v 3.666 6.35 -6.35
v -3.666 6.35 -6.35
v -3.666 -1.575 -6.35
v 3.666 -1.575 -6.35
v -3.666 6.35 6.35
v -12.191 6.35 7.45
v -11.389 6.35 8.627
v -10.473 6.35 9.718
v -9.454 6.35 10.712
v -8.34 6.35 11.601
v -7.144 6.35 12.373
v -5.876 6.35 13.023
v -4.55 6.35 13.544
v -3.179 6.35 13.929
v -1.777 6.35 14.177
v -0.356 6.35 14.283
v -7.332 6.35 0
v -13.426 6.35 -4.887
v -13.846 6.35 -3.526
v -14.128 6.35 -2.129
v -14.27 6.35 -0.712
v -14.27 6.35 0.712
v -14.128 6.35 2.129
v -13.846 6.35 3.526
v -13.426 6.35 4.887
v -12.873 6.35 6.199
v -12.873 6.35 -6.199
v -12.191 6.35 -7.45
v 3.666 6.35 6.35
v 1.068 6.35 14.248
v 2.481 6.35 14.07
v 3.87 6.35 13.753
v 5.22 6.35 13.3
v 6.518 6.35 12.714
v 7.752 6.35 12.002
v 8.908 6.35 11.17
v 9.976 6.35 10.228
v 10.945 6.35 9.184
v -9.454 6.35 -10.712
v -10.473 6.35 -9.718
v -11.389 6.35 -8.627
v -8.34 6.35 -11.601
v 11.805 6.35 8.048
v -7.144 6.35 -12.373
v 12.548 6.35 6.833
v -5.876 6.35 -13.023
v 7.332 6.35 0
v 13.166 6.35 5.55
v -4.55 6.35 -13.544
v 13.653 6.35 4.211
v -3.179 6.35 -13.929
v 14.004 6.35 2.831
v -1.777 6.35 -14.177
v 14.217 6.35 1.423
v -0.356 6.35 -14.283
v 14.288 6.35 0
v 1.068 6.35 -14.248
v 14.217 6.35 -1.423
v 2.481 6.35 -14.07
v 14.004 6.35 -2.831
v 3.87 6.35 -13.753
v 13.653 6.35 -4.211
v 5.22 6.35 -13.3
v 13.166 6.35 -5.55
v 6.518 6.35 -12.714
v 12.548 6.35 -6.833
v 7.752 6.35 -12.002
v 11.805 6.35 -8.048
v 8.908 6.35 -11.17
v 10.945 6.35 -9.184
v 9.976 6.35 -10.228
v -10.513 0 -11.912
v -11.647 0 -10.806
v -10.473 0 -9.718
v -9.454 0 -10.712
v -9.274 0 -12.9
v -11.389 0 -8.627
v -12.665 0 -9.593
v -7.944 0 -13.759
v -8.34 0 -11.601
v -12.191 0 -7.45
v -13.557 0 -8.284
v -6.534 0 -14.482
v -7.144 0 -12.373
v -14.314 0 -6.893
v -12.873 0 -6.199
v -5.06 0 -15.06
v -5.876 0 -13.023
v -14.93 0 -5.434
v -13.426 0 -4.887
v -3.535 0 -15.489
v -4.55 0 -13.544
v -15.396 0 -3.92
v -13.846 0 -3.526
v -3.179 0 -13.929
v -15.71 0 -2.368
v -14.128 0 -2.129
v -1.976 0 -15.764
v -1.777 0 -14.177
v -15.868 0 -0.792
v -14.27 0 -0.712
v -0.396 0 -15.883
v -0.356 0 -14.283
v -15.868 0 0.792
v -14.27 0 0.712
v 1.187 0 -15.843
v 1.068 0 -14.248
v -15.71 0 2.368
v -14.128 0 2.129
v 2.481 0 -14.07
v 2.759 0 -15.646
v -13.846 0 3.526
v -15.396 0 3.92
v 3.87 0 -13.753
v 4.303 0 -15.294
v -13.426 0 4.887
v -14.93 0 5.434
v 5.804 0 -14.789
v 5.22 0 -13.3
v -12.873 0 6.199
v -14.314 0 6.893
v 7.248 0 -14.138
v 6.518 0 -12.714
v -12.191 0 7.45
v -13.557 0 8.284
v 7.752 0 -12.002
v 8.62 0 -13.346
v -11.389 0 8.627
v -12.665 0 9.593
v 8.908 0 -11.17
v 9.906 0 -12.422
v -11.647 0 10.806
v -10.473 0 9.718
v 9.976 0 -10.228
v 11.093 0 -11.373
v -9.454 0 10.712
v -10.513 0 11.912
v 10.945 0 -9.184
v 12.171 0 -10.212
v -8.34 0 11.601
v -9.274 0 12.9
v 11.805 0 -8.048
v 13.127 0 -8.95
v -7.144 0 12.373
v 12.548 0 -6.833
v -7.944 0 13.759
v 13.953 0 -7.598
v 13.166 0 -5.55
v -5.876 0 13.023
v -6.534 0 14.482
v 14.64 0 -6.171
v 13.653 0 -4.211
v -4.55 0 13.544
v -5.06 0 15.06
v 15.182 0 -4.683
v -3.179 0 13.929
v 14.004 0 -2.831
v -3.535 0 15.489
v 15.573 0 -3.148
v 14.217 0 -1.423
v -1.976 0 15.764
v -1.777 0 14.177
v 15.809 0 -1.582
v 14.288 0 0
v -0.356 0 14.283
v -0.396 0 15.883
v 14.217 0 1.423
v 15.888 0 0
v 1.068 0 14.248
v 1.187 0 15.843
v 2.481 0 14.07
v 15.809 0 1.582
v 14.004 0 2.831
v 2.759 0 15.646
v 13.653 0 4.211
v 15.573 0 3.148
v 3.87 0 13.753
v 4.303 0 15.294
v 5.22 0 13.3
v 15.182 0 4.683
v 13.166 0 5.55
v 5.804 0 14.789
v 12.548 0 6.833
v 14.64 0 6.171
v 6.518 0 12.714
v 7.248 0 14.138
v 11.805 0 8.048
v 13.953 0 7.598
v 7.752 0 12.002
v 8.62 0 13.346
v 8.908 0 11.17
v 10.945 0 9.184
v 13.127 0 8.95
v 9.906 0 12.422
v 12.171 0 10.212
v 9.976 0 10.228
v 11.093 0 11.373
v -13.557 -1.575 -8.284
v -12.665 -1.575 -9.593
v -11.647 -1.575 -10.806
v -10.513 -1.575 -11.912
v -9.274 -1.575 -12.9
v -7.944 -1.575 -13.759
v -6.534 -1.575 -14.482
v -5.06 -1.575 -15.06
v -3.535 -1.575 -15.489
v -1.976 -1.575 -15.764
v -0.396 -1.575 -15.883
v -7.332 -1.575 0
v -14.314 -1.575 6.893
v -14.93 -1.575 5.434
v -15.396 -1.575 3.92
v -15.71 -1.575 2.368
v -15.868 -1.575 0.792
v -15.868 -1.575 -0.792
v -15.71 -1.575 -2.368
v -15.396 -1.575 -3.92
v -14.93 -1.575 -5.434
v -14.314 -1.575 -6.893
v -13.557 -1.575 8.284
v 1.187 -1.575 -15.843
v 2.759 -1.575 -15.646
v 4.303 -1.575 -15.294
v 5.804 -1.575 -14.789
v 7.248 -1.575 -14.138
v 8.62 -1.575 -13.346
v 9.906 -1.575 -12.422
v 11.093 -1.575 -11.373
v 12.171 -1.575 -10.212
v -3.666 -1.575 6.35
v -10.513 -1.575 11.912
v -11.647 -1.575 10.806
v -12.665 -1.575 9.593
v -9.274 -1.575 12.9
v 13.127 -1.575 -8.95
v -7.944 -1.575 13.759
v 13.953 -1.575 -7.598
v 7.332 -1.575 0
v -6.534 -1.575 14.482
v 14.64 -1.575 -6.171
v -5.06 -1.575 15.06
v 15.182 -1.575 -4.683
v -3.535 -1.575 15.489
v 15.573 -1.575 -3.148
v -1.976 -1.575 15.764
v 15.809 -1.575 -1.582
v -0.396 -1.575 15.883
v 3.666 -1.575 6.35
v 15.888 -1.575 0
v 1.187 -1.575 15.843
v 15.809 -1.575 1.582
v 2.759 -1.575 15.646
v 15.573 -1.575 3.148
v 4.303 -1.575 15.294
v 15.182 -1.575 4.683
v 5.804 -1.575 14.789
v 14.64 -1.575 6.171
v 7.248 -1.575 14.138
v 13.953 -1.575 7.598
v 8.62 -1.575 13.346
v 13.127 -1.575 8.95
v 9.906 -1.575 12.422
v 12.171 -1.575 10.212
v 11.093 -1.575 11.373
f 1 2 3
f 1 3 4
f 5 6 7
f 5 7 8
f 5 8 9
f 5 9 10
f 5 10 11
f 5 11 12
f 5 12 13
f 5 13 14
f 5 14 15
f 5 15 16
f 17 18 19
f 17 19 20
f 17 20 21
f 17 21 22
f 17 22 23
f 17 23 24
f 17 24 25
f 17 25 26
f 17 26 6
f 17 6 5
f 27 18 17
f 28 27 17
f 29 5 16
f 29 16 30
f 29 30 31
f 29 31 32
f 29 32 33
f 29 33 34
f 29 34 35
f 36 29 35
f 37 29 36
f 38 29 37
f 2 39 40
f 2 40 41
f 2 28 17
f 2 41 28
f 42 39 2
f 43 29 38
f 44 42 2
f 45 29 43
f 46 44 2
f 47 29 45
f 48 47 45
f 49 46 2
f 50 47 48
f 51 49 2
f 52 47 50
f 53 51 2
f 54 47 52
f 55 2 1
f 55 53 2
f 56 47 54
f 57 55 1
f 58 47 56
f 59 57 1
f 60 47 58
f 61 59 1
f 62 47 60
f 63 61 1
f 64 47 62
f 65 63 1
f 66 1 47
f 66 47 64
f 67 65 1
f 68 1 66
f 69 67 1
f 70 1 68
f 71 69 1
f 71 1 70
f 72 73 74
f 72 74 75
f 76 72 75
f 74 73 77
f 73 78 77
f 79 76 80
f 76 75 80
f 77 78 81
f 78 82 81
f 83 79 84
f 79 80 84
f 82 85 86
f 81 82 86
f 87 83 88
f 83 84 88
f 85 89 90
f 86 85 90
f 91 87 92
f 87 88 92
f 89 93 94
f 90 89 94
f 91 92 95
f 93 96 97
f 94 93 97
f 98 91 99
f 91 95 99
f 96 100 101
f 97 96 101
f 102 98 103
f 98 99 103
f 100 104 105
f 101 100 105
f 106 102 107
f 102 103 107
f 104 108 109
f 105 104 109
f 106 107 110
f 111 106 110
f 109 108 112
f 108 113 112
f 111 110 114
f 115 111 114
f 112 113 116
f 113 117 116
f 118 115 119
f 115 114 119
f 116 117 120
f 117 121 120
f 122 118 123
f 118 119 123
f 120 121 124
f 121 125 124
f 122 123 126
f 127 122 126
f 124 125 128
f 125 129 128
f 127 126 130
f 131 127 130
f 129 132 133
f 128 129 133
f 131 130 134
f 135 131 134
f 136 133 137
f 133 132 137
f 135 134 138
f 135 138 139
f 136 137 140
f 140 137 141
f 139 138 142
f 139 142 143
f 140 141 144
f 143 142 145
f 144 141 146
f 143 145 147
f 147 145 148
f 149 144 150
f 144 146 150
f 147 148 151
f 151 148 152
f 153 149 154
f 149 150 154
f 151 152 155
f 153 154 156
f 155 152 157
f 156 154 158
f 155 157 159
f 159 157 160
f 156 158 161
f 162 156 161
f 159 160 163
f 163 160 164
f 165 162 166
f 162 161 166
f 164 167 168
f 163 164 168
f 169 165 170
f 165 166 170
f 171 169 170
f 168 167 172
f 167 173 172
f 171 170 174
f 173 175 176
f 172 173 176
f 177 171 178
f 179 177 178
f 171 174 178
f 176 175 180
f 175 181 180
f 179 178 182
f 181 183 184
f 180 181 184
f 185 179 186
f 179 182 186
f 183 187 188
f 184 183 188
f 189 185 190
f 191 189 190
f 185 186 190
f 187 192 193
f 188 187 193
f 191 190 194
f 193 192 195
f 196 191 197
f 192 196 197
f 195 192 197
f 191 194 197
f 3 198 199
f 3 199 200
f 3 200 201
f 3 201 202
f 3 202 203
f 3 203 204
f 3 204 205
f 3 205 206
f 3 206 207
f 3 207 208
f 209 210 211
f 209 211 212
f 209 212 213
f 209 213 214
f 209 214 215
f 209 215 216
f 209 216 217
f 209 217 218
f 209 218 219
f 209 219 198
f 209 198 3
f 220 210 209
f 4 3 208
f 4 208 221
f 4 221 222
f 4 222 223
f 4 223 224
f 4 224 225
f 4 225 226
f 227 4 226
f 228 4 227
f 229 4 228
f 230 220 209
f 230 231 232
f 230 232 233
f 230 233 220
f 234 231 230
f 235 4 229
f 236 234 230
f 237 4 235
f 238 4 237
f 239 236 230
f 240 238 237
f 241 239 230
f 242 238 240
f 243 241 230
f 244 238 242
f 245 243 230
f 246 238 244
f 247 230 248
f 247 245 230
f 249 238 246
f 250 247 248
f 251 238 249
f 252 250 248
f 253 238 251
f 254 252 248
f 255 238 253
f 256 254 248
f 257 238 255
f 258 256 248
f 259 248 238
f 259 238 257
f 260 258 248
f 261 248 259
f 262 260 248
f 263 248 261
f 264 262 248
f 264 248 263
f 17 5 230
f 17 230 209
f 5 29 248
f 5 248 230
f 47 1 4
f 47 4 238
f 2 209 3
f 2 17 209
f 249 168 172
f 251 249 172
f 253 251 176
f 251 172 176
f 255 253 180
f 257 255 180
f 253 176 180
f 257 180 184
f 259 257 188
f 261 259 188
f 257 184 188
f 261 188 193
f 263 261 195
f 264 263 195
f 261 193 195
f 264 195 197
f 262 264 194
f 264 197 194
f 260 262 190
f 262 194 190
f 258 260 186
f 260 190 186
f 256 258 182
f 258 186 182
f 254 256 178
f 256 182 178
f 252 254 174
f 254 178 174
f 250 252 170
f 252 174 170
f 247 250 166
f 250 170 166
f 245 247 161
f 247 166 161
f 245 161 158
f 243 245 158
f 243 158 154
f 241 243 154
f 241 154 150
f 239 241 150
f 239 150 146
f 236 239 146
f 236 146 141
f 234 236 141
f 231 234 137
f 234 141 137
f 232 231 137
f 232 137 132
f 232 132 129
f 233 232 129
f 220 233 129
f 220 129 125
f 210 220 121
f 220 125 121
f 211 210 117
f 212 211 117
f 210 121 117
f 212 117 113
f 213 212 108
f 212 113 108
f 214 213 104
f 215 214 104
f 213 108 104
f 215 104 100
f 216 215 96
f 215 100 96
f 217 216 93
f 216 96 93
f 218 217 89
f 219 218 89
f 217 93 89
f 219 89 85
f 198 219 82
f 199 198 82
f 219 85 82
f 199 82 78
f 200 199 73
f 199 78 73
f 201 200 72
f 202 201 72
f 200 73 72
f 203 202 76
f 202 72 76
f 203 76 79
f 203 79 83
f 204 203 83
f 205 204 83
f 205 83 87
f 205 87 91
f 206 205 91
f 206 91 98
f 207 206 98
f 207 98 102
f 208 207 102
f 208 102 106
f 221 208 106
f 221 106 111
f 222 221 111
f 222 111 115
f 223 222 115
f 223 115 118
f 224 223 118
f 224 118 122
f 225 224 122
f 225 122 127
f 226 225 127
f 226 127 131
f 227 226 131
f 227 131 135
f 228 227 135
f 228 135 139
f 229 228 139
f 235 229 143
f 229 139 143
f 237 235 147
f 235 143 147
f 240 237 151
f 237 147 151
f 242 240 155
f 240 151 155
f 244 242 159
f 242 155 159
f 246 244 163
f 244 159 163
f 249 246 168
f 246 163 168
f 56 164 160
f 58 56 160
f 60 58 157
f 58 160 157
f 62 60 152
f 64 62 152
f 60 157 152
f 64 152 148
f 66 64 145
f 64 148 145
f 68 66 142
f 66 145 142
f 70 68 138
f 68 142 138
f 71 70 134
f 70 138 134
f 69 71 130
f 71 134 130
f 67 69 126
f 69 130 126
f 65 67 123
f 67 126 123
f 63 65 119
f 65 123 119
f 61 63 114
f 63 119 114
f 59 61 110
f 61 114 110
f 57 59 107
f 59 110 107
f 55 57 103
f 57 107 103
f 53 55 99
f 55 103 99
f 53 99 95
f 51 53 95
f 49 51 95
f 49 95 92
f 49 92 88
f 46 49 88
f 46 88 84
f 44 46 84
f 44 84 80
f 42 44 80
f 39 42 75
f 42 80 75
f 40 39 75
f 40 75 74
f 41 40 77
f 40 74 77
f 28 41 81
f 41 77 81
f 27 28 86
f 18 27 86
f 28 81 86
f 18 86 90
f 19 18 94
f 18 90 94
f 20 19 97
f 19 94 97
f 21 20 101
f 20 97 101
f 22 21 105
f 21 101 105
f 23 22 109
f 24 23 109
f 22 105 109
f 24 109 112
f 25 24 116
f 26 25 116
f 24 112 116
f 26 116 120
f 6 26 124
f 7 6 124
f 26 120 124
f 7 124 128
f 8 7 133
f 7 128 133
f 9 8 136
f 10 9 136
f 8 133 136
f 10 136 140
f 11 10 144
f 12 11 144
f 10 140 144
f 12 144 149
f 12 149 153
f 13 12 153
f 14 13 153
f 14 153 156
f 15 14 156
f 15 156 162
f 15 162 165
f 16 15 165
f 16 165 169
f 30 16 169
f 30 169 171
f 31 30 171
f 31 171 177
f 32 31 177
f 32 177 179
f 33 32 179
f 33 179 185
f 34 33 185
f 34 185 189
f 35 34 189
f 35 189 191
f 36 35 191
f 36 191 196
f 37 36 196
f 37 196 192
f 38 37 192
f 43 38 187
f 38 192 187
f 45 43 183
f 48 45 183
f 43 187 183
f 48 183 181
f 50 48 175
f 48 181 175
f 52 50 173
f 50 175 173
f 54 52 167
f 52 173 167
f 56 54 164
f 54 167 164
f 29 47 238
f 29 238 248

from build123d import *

# Parameters (mm, degrees)
SKETCH1_R           = 14.2875
BOSS_EXTRUDE1_DEPTH = 6.35
SKETCH2_R           = 15.8877
BOSS_EXTRUDE2_DEPTH = 1.5748


with BuildPart() as part:
    # Sketch1 → Boss-Extrude1 (new body)
    with BuildSketch(Plane(origin=(0, 0, 0), x_dir=(1, 0, 0), z_dir=(0, 1, 0))):
        Circle(SKETCH1_R)
        Polygon((7.332348419, 0), (3.666174209, 6.35), (-3.666174209, 6.35), (-7.332348419, 0), (-3.666174209, -6.35), (3.666174209, -6.35), align=None, mode=Mode.SUBTRACT)
    extrude(amount=BOSS_EXTRUDE1_DEPTH)

    # Sketch2 → Boss-Extrude2 (add)
    with BuildSketch(Plane.XZ):
        Circle(SKETCH2_R)
        Polygon((-7.332348419, 0), (-3.666174209, -6.35), (3.666174209, -6.35), (7.332348419, 0), (3.666174209, 6.35), (-3.666174209, 6.35), align=None, mode=Mode.SUBTRACT)
    extrude(amount=BOSS_EXTRUDE2_DEPTH)


solid = part.part
